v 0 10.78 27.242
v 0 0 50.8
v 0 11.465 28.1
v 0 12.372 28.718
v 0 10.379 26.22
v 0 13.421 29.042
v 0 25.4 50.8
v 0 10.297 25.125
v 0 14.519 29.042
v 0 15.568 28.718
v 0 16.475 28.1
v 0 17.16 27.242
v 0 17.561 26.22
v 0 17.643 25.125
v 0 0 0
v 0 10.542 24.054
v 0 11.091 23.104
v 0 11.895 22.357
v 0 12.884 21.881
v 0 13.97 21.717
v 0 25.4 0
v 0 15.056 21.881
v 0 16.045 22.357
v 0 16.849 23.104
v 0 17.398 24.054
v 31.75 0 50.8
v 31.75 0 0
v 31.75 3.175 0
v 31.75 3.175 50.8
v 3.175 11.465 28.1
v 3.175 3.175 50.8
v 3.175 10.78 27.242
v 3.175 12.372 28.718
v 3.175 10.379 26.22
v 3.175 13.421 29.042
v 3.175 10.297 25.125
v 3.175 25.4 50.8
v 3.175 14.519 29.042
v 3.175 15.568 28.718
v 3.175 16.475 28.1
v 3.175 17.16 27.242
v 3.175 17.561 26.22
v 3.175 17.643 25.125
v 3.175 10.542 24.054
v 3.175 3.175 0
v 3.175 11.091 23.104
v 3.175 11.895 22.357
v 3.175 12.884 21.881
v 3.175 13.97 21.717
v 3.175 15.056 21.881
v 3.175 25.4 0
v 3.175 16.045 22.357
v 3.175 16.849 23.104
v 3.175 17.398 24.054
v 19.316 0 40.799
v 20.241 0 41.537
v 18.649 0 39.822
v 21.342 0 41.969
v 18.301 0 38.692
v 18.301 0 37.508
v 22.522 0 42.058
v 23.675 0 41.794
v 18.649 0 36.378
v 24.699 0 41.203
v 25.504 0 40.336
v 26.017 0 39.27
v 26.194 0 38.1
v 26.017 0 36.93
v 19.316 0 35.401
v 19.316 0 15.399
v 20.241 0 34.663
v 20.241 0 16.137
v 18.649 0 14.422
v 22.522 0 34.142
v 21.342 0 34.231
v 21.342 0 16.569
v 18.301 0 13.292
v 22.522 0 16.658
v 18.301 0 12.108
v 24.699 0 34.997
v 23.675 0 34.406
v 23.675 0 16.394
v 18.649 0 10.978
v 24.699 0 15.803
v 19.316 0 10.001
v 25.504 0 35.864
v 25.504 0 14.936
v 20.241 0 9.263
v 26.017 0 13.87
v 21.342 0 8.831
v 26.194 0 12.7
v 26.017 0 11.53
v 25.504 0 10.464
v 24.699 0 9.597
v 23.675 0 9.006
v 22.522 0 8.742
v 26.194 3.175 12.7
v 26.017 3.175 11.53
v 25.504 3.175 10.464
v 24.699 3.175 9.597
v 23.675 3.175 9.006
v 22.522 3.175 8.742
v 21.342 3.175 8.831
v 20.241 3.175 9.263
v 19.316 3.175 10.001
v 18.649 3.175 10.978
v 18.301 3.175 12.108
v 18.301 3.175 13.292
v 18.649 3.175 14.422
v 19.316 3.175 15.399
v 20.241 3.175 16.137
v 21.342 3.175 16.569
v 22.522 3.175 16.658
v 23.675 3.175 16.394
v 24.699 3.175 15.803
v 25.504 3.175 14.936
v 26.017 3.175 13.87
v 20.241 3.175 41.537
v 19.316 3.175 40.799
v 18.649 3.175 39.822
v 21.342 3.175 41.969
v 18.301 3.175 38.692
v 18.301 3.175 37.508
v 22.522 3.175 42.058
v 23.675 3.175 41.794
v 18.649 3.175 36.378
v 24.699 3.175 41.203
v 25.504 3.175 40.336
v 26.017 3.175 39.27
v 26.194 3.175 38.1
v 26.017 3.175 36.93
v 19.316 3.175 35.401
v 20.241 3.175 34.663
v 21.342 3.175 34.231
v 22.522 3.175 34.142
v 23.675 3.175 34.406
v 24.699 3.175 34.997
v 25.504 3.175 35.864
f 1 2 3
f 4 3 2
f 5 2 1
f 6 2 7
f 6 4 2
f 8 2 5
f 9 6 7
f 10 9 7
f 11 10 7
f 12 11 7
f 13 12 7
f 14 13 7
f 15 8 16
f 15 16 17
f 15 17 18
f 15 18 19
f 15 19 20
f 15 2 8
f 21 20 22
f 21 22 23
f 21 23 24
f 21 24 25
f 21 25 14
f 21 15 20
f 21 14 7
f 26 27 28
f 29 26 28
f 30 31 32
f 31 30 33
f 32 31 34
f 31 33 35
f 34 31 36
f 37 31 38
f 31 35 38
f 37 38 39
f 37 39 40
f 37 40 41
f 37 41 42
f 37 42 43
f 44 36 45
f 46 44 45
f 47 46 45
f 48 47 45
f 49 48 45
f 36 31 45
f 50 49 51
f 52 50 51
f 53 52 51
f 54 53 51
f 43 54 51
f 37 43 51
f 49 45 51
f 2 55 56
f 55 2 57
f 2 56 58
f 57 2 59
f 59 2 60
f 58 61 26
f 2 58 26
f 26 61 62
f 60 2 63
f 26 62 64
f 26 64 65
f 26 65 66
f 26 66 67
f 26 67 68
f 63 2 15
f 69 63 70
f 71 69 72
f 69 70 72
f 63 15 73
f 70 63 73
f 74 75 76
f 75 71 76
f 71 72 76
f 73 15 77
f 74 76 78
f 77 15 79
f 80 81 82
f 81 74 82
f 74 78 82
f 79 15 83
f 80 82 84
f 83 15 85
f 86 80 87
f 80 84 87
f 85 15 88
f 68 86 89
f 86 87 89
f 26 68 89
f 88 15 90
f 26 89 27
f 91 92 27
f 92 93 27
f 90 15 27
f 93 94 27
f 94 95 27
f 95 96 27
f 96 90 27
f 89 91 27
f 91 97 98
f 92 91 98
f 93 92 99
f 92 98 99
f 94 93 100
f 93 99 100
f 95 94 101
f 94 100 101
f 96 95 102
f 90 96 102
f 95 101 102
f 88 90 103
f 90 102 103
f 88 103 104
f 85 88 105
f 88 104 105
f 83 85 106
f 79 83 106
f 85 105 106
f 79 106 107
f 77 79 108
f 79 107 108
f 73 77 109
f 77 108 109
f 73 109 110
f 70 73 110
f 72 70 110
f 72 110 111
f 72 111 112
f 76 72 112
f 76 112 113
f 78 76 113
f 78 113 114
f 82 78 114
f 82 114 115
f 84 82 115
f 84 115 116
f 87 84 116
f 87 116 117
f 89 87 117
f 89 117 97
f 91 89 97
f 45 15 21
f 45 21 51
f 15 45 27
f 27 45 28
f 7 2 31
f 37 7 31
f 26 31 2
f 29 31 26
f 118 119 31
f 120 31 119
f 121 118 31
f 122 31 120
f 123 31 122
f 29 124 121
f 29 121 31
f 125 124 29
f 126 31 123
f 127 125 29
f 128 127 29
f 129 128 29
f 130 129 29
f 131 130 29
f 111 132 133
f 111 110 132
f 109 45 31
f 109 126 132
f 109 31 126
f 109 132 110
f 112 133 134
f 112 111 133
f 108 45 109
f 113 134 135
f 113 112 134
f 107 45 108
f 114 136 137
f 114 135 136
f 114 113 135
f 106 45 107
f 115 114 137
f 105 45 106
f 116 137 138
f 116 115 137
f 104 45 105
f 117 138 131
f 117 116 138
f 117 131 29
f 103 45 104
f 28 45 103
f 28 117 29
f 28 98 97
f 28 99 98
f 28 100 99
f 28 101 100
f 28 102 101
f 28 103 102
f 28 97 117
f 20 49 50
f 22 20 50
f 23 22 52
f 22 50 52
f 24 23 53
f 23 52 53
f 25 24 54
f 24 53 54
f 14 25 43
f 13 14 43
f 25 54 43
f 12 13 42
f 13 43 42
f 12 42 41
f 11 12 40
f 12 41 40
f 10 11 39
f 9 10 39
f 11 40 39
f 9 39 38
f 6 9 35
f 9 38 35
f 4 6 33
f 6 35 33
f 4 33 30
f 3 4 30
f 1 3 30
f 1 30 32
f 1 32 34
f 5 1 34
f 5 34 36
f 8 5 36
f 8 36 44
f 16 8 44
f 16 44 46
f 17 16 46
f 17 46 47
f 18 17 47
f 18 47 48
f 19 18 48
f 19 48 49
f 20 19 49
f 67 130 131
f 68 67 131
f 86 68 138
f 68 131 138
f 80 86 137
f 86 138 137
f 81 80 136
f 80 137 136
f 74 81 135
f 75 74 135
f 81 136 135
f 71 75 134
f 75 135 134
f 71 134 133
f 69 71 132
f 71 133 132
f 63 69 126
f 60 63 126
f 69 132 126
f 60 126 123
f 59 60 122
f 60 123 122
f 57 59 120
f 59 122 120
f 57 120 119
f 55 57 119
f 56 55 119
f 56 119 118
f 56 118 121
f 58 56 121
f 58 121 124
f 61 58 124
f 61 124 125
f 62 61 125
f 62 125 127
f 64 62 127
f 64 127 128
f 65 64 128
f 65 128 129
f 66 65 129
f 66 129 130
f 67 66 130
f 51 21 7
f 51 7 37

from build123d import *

# Parameters (mm, degrees)
SKETCH1_W           = 3.175
SKETCH1_H           = 25.4
SKETCH1_W_2         = 28.575
SKETCH1_H_2         = 3.175
BOSS_EXTRUDE1_DEPTH = 50.8
POT_MOUNT_REACH     = 5.175
SKETCH2_R           = 3.683
BASE_MOUNT_REACH    = 5.175
SKETCH3_R           = 3.96875


with BuildPart() as part:
    # Sketch1 → Boss-Extrude1 (new body)
    with BuildSketch(Plane.XY):
        with Locations((1.5875, 12.7)):
            Rectangle(SKETCH1_W, SKETCH1_H)
        with Locations((17.4625, 1.5875)):
            Rectangle(SKETCH1_W_2, SKETCH1_H_2)
    extrude(amount=BOSS_EXTRUDE1_DEPTH)

    # Sketch2 → Pot Mount (cut, up to next)
    with BuildSketch(Plane(origin=(3.175, 0, 0), x_dir=(0, 0, -1), z_dir=(1, 0, 0)), mode=Mode.PRIVATE) as pot_mount_sk1:
        with Locations((-25.4, 13.97)):
            Circle(SKETCH2_R)
    pot_mount_tool1 = extrude(pot_mount_sk1.sketch, amount=-POT_MOUNT_REACH, mode=Mode.PRIVATE) & part.part
    add(pot_mount_tool1.solids().sort_by_distance((3.175, 13.97, 25.4))[0], mode=Mode.SUBTRACT)

    # Sketch3 → Base Mount (cut, up to next)
    with BuildSketch(Plane(origin=(0, 3.175, 0), x_dir=(1, 0, 0), z_dir=(0, 1, 0)), mode=Mode.PRIVATE) as base_mount_sk1:
        with Locations((22.225, -38.1)):
            Circle(SKETCH3_R)
    base_mount_tool1 = extrude(base_mount_sk1.sketch, amount=-BASE_MOUNT_REACH, mode=Mode.PRIVATE) & part.part
    add(base_mount_tool1.solids().sort_by_distance((22.225, 3.175, 38.1))[0], mode=Mode.SUBTRACT)
    # Sketch3 → Base Mount (cut, up to next)
    with BuildSketch(Plane(origin=(0, 3.175, 0), x_dir=(1, 0, 0), z_dir=(0, 1, 0)), mode=Mode.PRIVATE) as base_mount_sk2:
        with Locations((22.225, -12.7)):
            Circle(SKETCH3_R)
    base_mount_tool2 = extrude(base_mount_sk2.sketch, amount=-BASE_MOUNT_REACH, mode=Mode.PRIVATE) & part.part
    add(base_mount_tool2.solids().sort_by_distance((22.225, 3.175, 12.7))[0], mode=Mode.SUBTRACT)


solid = part.part
